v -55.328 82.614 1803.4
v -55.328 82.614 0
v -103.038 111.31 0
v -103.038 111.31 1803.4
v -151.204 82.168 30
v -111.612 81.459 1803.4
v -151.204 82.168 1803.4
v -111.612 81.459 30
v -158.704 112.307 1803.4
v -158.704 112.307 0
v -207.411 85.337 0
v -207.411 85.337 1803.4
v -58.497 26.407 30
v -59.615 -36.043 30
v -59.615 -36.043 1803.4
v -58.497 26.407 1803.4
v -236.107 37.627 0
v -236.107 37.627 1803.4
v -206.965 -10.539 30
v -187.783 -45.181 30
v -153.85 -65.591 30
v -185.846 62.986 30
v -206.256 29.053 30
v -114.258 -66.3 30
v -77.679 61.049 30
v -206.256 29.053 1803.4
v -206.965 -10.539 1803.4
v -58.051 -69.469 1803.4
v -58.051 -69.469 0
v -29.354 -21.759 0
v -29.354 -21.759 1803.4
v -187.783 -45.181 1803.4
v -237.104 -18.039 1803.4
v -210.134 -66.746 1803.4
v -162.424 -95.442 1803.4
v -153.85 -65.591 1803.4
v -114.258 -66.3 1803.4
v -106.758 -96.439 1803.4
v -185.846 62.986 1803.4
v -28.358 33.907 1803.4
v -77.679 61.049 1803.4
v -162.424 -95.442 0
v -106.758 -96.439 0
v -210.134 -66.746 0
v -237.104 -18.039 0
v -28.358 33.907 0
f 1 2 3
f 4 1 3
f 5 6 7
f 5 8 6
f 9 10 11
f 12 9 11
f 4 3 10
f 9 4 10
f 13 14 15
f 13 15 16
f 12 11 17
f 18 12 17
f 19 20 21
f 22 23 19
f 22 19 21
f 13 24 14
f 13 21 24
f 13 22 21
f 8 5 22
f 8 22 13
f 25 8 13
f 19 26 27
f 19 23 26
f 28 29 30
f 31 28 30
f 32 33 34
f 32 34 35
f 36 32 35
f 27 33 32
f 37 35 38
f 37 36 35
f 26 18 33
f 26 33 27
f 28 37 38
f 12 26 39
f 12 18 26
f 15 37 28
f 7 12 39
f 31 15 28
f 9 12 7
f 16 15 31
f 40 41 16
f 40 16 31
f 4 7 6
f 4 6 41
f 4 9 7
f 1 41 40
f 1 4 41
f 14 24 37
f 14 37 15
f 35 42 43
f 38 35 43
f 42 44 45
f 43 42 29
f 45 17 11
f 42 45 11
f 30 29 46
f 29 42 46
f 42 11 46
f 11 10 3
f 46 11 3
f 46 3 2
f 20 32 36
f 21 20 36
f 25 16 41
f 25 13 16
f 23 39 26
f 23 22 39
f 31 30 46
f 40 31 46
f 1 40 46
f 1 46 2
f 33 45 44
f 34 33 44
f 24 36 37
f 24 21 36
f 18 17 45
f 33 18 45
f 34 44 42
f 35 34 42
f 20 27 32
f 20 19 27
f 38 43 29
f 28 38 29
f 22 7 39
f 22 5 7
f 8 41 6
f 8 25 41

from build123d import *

# Parameters (mm, degrees)
F1_DEPTH = 1803.4
F2_T     = -30


with BuildPart() as f1:
    # F0 (on Top) → F1 (new body)
    with BuildSketch(Plane.XY):
        Polygon((-58.050863, -69.46938), (-29.354431, -21.759306), (-28.35763, 33.907045), (-55.32755, 82.613921), (-103.037623, 111.310352), (-158.703975, 112.307154), (-207.41085, 85.337233), (-236.107282, 37.62716), (-237.104083, -18.039192), (-210.134163, -66.746067), (-162.42409, -95.442498), (-106.757738, -96.4393), align=None)
    extrude(amount=F1_DEPTH)

    # F2
    f2_openings = [f1.faces().sort_by_distance(p)[0] for p in [
        (-43.702647, -45.614343, 901.7),
        (-132.730857, 7.933927, 1803.4),
    ]]
    offset(amount=F2_T, openings=f2_openings)


solid = f1.part
